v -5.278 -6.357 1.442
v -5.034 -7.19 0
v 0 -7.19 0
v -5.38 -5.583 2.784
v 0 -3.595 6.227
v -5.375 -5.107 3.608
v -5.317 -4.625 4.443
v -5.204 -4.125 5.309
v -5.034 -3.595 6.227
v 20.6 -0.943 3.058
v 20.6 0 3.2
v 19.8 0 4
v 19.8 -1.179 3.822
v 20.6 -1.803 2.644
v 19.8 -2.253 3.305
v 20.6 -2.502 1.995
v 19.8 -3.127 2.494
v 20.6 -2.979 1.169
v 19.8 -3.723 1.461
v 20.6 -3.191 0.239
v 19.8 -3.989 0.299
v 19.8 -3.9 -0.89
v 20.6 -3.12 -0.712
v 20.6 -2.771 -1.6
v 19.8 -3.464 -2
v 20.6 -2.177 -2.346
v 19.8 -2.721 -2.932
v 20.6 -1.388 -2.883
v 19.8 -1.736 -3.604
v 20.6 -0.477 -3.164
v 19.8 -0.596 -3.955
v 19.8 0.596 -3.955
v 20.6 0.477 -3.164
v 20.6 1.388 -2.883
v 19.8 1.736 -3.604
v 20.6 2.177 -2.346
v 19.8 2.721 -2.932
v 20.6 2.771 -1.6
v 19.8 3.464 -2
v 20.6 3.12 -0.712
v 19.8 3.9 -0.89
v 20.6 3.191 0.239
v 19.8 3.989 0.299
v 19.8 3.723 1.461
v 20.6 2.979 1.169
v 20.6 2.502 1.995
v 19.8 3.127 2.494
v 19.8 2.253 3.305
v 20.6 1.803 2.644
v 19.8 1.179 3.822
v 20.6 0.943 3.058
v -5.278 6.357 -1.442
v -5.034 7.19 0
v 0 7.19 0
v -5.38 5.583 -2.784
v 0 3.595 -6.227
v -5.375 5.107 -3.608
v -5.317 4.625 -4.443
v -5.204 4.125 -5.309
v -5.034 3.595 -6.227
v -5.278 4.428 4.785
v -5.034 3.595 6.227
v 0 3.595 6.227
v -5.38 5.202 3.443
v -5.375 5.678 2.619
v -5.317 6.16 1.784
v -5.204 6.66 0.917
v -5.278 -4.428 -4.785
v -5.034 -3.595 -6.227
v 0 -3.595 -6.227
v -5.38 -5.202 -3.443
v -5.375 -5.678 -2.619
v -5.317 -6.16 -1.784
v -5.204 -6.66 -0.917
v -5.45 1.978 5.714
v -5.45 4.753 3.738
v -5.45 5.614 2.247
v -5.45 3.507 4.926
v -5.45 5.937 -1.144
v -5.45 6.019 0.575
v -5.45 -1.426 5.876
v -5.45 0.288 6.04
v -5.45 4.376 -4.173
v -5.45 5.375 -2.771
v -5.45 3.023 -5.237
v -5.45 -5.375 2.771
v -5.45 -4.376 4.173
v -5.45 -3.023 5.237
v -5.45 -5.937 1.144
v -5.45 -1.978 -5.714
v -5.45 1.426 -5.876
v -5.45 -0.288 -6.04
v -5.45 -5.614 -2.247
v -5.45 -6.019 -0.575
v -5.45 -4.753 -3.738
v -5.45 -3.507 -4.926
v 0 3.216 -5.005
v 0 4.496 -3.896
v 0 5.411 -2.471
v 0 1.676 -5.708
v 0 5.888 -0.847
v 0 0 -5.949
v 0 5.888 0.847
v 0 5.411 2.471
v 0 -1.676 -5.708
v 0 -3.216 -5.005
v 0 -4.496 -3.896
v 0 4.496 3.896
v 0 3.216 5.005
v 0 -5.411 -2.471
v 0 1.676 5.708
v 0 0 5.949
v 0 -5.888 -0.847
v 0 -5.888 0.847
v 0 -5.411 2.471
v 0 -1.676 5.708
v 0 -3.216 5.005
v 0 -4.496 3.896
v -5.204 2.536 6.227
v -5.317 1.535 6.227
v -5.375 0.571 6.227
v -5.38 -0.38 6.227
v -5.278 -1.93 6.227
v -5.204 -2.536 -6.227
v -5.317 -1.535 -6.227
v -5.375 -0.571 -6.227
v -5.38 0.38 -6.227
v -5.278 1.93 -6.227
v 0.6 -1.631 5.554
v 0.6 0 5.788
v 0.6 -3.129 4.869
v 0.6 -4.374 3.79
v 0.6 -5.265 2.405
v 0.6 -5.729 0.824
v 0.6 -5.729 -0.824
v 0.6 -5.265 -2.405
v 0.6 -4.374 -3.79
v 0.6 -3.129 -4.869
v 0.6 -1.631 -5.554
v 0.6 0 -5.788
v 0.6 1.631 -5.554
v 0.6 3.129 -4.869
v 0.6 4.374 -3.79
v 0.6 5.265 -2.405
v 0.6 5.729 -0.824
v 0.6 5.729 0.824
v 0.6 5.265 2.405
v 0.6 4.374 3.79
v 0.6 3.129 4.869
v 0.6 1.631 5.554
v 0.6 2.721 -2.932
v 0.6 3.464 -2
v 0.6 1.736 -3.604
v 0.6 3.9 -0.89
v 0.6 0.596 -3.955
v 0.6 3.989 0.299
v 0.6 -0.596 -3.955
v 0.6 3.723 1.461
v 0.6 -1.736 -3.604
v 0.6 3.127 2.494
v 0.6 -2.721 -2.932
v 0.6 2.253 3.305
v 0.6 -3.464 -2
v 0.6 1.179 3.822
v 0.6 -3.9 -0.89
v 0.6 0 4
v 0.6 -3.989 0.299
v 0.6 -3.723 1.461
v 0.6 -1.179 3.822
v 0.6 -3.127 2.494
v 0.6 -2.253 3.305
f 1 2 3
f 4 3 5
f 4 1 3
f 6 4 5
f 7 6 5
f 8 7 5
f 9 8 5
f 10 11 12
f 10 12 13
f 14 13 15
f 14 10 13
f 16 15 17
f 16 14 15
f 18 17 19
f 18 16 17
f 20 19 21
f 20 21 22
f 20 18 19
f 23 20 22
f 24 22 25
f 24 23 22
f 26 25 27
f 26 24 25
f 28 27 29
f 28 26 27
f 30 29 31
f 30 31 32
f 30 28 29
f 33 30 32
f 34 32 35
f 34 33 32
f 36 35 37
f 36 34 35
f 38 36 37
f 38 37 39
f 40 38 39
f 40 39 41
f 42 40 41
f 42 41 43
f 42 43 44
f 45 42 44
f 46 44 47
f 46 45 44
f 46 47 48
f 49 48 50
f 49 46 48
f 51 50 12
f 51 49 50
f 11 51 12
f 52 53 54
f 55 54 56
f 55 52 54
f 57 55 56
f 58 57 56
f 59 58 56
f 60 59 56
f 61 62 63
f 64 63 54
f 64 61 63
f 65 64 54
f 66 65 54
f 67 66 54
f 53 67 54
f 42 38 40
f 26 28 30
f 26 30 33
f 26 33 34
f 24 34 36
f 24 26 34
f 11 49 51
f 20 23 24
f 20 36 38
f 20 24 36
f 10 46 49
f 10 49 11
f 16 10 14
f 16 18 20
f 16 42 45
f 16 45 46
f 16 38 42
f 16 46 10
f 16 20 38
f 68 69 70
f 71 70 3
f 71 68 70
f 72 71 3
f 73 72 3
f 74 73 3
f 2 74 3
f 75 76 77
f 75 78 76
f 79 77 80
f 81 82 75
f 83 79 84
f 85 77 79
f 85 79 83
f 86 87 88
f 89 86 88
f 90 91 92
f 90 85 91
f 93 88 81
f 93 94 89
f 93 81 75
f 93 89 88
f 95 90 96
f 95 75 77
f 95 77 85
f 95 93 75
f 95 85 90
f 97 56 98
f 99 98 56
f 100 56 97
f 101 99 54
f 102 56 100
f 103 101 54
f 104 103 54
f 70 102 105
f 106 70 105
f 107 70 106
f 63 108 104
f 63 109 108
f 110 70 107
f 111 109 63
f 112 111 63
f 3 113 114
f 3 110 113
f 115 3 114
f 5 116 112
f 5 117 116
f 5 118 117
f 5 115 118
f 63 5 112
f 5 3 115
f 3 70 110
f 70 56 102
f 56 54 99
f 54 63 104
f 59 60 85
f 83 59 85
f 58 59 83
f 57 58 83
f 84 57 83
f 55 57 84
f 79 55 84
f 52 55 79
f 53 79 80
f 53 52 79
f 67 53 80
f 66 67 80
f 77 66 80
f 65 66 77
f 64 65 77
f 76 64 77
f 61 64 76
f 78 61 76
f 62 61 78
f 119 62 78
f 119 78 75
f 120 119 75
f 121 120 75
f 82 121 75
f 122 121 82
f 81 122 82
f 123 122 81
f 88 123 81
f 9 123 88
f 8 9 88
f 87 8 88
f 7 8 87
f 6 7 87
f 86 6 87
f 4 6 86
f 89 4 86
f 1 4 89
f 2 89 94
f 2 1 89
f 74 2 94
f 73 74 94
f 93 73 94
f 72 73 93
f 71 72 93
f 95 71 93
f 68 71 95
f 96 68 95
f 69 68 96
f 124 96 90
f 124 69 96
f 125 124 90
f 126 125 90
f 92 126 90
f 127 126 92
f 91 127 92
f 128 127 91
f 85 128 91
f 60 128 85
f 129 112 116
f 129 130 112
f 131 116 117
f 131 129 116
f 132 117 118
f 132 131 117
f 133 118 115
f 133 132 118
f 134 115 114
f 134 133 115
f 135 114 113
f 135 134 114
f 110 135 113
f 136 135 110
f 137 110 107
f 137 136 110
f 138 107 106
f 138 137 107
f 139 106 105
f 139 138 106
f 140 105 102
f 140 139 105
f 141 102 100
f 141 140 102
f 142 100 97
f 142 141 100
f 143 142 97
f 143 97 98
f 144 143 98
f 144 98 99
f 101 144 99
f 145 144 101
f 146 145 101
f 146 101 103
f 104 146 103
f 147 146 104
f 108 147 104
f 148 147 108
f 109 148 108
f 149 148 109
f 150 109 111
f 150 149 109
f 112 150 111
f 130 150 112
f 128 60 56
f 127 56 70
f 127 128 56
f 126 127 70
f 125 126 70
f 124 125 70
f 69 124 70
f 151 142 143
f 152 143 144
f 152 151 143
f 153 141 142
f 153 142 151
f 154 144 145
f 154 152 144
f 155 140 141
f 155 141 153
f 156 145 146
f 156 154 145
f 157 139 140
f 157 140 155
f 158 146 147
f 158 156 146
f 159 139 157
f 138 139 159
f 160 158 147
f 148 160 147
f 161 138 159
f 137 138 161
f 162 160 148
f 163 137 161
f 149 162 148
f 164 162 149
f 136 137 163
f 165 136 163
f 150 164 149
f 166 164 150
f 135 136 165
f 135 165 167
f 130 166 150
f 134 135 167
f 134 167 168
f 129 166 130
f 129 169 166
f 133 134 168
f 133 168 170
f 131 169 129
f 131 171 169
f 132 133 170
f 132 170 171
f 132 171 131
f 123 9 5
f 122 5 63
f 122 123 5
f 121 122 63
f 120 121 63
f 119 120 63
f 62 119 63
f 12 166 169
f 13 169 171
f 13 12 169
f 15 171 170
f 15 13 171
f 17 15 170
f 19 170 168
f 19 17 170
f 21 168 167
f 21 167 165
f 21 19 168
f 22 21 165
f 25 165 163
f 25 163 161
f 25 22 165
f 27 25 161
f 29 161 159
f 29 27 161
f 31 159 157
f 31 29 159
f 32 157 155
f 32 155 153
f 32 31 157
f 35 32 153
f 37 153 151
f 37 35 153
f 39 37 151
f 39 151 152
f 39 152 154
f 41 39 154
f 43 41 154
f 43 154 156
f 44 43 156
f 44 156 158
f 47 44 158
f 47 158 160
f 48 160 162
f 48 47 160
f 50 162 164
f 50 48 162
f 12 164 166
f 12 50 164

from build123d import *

# Parameters (mm, degrees)
SKETCH_2_OUTSIDE_W  = 22.99
SKETCH_2_OUTSIDE_H  = 22.99
CUT_EXTRUDE_1_DEPTH = 28.964168144
CHAMFER_1_SIZE      = 0.8


with BuildPart() as part:
    # Эскиз1 → Повернуть1 (revolve)
    with BuildSketch(Plane.XY, mode=Mode.PRIVATE) as revolve_1_sk:
        Polygon((-5.45, 0), (-5.45, 7.19), (0, 7.19), (0, 5.948974596), (0.6, 5.788205081), (0.6, 4), (20.6, 4), (20.6, 0), align=None)
    revolve(revolve_1_sk.sketch.rotate(Axis((-1000, 0, 0), (1, 0, 0)), 90), axis=Axis((-1000, 0, 0), (1, 0, 0)))

    # Эскиз2 outside → Вырез-Вытянуть1 (cut, through all)
    with BuildSketch(Plane.ZY.offset(5.45)):
        Rectangle(SKETCH_2_OUTSIDE_W, SKETCH_2_OUTSIDE_H)
        Polygon((0, -7.19), (6.226722653, -3.595), (6.226722653, 3.595), (0, 7.19), (-6.226722653, 3.595), (-6.226722653, -3.595), align=None, mode=Mode.SUBTRACT)
    extrude(amount=-CUT_EXTRUDE_1_DEPTH, mode=Mode.SUBTRACT)

    # Эскиз4 → Вырез-Повернуть1 (revolve, cut)
    with BuildSketch(Plane.XY, mode=Mode.PRIVATE) as cut_revolve_1_sk:
        Polygon((-5.45, 6.04675), (-5.03389103, 7.19), (-5.45, 7.19), align=None)
    revolve(cut_revolve_1_sk.sketch.rotate(Axis((-1000, 0, 0), (1, 0, 0)), 299.999999983), axis=Axis((-1000, 0, 0), (1, 0, 0)), mode=Mode.SUBTRACT)

    # Фаска1
    chamfer_1_edges = [part.edges().sort_by_distance(p)[0] for p in [
        (20.6, 0, -4),
    ]]
    chamfer(chamfer_1_edges, length=CHAMFER_1_SIZE)


solid = part.part
